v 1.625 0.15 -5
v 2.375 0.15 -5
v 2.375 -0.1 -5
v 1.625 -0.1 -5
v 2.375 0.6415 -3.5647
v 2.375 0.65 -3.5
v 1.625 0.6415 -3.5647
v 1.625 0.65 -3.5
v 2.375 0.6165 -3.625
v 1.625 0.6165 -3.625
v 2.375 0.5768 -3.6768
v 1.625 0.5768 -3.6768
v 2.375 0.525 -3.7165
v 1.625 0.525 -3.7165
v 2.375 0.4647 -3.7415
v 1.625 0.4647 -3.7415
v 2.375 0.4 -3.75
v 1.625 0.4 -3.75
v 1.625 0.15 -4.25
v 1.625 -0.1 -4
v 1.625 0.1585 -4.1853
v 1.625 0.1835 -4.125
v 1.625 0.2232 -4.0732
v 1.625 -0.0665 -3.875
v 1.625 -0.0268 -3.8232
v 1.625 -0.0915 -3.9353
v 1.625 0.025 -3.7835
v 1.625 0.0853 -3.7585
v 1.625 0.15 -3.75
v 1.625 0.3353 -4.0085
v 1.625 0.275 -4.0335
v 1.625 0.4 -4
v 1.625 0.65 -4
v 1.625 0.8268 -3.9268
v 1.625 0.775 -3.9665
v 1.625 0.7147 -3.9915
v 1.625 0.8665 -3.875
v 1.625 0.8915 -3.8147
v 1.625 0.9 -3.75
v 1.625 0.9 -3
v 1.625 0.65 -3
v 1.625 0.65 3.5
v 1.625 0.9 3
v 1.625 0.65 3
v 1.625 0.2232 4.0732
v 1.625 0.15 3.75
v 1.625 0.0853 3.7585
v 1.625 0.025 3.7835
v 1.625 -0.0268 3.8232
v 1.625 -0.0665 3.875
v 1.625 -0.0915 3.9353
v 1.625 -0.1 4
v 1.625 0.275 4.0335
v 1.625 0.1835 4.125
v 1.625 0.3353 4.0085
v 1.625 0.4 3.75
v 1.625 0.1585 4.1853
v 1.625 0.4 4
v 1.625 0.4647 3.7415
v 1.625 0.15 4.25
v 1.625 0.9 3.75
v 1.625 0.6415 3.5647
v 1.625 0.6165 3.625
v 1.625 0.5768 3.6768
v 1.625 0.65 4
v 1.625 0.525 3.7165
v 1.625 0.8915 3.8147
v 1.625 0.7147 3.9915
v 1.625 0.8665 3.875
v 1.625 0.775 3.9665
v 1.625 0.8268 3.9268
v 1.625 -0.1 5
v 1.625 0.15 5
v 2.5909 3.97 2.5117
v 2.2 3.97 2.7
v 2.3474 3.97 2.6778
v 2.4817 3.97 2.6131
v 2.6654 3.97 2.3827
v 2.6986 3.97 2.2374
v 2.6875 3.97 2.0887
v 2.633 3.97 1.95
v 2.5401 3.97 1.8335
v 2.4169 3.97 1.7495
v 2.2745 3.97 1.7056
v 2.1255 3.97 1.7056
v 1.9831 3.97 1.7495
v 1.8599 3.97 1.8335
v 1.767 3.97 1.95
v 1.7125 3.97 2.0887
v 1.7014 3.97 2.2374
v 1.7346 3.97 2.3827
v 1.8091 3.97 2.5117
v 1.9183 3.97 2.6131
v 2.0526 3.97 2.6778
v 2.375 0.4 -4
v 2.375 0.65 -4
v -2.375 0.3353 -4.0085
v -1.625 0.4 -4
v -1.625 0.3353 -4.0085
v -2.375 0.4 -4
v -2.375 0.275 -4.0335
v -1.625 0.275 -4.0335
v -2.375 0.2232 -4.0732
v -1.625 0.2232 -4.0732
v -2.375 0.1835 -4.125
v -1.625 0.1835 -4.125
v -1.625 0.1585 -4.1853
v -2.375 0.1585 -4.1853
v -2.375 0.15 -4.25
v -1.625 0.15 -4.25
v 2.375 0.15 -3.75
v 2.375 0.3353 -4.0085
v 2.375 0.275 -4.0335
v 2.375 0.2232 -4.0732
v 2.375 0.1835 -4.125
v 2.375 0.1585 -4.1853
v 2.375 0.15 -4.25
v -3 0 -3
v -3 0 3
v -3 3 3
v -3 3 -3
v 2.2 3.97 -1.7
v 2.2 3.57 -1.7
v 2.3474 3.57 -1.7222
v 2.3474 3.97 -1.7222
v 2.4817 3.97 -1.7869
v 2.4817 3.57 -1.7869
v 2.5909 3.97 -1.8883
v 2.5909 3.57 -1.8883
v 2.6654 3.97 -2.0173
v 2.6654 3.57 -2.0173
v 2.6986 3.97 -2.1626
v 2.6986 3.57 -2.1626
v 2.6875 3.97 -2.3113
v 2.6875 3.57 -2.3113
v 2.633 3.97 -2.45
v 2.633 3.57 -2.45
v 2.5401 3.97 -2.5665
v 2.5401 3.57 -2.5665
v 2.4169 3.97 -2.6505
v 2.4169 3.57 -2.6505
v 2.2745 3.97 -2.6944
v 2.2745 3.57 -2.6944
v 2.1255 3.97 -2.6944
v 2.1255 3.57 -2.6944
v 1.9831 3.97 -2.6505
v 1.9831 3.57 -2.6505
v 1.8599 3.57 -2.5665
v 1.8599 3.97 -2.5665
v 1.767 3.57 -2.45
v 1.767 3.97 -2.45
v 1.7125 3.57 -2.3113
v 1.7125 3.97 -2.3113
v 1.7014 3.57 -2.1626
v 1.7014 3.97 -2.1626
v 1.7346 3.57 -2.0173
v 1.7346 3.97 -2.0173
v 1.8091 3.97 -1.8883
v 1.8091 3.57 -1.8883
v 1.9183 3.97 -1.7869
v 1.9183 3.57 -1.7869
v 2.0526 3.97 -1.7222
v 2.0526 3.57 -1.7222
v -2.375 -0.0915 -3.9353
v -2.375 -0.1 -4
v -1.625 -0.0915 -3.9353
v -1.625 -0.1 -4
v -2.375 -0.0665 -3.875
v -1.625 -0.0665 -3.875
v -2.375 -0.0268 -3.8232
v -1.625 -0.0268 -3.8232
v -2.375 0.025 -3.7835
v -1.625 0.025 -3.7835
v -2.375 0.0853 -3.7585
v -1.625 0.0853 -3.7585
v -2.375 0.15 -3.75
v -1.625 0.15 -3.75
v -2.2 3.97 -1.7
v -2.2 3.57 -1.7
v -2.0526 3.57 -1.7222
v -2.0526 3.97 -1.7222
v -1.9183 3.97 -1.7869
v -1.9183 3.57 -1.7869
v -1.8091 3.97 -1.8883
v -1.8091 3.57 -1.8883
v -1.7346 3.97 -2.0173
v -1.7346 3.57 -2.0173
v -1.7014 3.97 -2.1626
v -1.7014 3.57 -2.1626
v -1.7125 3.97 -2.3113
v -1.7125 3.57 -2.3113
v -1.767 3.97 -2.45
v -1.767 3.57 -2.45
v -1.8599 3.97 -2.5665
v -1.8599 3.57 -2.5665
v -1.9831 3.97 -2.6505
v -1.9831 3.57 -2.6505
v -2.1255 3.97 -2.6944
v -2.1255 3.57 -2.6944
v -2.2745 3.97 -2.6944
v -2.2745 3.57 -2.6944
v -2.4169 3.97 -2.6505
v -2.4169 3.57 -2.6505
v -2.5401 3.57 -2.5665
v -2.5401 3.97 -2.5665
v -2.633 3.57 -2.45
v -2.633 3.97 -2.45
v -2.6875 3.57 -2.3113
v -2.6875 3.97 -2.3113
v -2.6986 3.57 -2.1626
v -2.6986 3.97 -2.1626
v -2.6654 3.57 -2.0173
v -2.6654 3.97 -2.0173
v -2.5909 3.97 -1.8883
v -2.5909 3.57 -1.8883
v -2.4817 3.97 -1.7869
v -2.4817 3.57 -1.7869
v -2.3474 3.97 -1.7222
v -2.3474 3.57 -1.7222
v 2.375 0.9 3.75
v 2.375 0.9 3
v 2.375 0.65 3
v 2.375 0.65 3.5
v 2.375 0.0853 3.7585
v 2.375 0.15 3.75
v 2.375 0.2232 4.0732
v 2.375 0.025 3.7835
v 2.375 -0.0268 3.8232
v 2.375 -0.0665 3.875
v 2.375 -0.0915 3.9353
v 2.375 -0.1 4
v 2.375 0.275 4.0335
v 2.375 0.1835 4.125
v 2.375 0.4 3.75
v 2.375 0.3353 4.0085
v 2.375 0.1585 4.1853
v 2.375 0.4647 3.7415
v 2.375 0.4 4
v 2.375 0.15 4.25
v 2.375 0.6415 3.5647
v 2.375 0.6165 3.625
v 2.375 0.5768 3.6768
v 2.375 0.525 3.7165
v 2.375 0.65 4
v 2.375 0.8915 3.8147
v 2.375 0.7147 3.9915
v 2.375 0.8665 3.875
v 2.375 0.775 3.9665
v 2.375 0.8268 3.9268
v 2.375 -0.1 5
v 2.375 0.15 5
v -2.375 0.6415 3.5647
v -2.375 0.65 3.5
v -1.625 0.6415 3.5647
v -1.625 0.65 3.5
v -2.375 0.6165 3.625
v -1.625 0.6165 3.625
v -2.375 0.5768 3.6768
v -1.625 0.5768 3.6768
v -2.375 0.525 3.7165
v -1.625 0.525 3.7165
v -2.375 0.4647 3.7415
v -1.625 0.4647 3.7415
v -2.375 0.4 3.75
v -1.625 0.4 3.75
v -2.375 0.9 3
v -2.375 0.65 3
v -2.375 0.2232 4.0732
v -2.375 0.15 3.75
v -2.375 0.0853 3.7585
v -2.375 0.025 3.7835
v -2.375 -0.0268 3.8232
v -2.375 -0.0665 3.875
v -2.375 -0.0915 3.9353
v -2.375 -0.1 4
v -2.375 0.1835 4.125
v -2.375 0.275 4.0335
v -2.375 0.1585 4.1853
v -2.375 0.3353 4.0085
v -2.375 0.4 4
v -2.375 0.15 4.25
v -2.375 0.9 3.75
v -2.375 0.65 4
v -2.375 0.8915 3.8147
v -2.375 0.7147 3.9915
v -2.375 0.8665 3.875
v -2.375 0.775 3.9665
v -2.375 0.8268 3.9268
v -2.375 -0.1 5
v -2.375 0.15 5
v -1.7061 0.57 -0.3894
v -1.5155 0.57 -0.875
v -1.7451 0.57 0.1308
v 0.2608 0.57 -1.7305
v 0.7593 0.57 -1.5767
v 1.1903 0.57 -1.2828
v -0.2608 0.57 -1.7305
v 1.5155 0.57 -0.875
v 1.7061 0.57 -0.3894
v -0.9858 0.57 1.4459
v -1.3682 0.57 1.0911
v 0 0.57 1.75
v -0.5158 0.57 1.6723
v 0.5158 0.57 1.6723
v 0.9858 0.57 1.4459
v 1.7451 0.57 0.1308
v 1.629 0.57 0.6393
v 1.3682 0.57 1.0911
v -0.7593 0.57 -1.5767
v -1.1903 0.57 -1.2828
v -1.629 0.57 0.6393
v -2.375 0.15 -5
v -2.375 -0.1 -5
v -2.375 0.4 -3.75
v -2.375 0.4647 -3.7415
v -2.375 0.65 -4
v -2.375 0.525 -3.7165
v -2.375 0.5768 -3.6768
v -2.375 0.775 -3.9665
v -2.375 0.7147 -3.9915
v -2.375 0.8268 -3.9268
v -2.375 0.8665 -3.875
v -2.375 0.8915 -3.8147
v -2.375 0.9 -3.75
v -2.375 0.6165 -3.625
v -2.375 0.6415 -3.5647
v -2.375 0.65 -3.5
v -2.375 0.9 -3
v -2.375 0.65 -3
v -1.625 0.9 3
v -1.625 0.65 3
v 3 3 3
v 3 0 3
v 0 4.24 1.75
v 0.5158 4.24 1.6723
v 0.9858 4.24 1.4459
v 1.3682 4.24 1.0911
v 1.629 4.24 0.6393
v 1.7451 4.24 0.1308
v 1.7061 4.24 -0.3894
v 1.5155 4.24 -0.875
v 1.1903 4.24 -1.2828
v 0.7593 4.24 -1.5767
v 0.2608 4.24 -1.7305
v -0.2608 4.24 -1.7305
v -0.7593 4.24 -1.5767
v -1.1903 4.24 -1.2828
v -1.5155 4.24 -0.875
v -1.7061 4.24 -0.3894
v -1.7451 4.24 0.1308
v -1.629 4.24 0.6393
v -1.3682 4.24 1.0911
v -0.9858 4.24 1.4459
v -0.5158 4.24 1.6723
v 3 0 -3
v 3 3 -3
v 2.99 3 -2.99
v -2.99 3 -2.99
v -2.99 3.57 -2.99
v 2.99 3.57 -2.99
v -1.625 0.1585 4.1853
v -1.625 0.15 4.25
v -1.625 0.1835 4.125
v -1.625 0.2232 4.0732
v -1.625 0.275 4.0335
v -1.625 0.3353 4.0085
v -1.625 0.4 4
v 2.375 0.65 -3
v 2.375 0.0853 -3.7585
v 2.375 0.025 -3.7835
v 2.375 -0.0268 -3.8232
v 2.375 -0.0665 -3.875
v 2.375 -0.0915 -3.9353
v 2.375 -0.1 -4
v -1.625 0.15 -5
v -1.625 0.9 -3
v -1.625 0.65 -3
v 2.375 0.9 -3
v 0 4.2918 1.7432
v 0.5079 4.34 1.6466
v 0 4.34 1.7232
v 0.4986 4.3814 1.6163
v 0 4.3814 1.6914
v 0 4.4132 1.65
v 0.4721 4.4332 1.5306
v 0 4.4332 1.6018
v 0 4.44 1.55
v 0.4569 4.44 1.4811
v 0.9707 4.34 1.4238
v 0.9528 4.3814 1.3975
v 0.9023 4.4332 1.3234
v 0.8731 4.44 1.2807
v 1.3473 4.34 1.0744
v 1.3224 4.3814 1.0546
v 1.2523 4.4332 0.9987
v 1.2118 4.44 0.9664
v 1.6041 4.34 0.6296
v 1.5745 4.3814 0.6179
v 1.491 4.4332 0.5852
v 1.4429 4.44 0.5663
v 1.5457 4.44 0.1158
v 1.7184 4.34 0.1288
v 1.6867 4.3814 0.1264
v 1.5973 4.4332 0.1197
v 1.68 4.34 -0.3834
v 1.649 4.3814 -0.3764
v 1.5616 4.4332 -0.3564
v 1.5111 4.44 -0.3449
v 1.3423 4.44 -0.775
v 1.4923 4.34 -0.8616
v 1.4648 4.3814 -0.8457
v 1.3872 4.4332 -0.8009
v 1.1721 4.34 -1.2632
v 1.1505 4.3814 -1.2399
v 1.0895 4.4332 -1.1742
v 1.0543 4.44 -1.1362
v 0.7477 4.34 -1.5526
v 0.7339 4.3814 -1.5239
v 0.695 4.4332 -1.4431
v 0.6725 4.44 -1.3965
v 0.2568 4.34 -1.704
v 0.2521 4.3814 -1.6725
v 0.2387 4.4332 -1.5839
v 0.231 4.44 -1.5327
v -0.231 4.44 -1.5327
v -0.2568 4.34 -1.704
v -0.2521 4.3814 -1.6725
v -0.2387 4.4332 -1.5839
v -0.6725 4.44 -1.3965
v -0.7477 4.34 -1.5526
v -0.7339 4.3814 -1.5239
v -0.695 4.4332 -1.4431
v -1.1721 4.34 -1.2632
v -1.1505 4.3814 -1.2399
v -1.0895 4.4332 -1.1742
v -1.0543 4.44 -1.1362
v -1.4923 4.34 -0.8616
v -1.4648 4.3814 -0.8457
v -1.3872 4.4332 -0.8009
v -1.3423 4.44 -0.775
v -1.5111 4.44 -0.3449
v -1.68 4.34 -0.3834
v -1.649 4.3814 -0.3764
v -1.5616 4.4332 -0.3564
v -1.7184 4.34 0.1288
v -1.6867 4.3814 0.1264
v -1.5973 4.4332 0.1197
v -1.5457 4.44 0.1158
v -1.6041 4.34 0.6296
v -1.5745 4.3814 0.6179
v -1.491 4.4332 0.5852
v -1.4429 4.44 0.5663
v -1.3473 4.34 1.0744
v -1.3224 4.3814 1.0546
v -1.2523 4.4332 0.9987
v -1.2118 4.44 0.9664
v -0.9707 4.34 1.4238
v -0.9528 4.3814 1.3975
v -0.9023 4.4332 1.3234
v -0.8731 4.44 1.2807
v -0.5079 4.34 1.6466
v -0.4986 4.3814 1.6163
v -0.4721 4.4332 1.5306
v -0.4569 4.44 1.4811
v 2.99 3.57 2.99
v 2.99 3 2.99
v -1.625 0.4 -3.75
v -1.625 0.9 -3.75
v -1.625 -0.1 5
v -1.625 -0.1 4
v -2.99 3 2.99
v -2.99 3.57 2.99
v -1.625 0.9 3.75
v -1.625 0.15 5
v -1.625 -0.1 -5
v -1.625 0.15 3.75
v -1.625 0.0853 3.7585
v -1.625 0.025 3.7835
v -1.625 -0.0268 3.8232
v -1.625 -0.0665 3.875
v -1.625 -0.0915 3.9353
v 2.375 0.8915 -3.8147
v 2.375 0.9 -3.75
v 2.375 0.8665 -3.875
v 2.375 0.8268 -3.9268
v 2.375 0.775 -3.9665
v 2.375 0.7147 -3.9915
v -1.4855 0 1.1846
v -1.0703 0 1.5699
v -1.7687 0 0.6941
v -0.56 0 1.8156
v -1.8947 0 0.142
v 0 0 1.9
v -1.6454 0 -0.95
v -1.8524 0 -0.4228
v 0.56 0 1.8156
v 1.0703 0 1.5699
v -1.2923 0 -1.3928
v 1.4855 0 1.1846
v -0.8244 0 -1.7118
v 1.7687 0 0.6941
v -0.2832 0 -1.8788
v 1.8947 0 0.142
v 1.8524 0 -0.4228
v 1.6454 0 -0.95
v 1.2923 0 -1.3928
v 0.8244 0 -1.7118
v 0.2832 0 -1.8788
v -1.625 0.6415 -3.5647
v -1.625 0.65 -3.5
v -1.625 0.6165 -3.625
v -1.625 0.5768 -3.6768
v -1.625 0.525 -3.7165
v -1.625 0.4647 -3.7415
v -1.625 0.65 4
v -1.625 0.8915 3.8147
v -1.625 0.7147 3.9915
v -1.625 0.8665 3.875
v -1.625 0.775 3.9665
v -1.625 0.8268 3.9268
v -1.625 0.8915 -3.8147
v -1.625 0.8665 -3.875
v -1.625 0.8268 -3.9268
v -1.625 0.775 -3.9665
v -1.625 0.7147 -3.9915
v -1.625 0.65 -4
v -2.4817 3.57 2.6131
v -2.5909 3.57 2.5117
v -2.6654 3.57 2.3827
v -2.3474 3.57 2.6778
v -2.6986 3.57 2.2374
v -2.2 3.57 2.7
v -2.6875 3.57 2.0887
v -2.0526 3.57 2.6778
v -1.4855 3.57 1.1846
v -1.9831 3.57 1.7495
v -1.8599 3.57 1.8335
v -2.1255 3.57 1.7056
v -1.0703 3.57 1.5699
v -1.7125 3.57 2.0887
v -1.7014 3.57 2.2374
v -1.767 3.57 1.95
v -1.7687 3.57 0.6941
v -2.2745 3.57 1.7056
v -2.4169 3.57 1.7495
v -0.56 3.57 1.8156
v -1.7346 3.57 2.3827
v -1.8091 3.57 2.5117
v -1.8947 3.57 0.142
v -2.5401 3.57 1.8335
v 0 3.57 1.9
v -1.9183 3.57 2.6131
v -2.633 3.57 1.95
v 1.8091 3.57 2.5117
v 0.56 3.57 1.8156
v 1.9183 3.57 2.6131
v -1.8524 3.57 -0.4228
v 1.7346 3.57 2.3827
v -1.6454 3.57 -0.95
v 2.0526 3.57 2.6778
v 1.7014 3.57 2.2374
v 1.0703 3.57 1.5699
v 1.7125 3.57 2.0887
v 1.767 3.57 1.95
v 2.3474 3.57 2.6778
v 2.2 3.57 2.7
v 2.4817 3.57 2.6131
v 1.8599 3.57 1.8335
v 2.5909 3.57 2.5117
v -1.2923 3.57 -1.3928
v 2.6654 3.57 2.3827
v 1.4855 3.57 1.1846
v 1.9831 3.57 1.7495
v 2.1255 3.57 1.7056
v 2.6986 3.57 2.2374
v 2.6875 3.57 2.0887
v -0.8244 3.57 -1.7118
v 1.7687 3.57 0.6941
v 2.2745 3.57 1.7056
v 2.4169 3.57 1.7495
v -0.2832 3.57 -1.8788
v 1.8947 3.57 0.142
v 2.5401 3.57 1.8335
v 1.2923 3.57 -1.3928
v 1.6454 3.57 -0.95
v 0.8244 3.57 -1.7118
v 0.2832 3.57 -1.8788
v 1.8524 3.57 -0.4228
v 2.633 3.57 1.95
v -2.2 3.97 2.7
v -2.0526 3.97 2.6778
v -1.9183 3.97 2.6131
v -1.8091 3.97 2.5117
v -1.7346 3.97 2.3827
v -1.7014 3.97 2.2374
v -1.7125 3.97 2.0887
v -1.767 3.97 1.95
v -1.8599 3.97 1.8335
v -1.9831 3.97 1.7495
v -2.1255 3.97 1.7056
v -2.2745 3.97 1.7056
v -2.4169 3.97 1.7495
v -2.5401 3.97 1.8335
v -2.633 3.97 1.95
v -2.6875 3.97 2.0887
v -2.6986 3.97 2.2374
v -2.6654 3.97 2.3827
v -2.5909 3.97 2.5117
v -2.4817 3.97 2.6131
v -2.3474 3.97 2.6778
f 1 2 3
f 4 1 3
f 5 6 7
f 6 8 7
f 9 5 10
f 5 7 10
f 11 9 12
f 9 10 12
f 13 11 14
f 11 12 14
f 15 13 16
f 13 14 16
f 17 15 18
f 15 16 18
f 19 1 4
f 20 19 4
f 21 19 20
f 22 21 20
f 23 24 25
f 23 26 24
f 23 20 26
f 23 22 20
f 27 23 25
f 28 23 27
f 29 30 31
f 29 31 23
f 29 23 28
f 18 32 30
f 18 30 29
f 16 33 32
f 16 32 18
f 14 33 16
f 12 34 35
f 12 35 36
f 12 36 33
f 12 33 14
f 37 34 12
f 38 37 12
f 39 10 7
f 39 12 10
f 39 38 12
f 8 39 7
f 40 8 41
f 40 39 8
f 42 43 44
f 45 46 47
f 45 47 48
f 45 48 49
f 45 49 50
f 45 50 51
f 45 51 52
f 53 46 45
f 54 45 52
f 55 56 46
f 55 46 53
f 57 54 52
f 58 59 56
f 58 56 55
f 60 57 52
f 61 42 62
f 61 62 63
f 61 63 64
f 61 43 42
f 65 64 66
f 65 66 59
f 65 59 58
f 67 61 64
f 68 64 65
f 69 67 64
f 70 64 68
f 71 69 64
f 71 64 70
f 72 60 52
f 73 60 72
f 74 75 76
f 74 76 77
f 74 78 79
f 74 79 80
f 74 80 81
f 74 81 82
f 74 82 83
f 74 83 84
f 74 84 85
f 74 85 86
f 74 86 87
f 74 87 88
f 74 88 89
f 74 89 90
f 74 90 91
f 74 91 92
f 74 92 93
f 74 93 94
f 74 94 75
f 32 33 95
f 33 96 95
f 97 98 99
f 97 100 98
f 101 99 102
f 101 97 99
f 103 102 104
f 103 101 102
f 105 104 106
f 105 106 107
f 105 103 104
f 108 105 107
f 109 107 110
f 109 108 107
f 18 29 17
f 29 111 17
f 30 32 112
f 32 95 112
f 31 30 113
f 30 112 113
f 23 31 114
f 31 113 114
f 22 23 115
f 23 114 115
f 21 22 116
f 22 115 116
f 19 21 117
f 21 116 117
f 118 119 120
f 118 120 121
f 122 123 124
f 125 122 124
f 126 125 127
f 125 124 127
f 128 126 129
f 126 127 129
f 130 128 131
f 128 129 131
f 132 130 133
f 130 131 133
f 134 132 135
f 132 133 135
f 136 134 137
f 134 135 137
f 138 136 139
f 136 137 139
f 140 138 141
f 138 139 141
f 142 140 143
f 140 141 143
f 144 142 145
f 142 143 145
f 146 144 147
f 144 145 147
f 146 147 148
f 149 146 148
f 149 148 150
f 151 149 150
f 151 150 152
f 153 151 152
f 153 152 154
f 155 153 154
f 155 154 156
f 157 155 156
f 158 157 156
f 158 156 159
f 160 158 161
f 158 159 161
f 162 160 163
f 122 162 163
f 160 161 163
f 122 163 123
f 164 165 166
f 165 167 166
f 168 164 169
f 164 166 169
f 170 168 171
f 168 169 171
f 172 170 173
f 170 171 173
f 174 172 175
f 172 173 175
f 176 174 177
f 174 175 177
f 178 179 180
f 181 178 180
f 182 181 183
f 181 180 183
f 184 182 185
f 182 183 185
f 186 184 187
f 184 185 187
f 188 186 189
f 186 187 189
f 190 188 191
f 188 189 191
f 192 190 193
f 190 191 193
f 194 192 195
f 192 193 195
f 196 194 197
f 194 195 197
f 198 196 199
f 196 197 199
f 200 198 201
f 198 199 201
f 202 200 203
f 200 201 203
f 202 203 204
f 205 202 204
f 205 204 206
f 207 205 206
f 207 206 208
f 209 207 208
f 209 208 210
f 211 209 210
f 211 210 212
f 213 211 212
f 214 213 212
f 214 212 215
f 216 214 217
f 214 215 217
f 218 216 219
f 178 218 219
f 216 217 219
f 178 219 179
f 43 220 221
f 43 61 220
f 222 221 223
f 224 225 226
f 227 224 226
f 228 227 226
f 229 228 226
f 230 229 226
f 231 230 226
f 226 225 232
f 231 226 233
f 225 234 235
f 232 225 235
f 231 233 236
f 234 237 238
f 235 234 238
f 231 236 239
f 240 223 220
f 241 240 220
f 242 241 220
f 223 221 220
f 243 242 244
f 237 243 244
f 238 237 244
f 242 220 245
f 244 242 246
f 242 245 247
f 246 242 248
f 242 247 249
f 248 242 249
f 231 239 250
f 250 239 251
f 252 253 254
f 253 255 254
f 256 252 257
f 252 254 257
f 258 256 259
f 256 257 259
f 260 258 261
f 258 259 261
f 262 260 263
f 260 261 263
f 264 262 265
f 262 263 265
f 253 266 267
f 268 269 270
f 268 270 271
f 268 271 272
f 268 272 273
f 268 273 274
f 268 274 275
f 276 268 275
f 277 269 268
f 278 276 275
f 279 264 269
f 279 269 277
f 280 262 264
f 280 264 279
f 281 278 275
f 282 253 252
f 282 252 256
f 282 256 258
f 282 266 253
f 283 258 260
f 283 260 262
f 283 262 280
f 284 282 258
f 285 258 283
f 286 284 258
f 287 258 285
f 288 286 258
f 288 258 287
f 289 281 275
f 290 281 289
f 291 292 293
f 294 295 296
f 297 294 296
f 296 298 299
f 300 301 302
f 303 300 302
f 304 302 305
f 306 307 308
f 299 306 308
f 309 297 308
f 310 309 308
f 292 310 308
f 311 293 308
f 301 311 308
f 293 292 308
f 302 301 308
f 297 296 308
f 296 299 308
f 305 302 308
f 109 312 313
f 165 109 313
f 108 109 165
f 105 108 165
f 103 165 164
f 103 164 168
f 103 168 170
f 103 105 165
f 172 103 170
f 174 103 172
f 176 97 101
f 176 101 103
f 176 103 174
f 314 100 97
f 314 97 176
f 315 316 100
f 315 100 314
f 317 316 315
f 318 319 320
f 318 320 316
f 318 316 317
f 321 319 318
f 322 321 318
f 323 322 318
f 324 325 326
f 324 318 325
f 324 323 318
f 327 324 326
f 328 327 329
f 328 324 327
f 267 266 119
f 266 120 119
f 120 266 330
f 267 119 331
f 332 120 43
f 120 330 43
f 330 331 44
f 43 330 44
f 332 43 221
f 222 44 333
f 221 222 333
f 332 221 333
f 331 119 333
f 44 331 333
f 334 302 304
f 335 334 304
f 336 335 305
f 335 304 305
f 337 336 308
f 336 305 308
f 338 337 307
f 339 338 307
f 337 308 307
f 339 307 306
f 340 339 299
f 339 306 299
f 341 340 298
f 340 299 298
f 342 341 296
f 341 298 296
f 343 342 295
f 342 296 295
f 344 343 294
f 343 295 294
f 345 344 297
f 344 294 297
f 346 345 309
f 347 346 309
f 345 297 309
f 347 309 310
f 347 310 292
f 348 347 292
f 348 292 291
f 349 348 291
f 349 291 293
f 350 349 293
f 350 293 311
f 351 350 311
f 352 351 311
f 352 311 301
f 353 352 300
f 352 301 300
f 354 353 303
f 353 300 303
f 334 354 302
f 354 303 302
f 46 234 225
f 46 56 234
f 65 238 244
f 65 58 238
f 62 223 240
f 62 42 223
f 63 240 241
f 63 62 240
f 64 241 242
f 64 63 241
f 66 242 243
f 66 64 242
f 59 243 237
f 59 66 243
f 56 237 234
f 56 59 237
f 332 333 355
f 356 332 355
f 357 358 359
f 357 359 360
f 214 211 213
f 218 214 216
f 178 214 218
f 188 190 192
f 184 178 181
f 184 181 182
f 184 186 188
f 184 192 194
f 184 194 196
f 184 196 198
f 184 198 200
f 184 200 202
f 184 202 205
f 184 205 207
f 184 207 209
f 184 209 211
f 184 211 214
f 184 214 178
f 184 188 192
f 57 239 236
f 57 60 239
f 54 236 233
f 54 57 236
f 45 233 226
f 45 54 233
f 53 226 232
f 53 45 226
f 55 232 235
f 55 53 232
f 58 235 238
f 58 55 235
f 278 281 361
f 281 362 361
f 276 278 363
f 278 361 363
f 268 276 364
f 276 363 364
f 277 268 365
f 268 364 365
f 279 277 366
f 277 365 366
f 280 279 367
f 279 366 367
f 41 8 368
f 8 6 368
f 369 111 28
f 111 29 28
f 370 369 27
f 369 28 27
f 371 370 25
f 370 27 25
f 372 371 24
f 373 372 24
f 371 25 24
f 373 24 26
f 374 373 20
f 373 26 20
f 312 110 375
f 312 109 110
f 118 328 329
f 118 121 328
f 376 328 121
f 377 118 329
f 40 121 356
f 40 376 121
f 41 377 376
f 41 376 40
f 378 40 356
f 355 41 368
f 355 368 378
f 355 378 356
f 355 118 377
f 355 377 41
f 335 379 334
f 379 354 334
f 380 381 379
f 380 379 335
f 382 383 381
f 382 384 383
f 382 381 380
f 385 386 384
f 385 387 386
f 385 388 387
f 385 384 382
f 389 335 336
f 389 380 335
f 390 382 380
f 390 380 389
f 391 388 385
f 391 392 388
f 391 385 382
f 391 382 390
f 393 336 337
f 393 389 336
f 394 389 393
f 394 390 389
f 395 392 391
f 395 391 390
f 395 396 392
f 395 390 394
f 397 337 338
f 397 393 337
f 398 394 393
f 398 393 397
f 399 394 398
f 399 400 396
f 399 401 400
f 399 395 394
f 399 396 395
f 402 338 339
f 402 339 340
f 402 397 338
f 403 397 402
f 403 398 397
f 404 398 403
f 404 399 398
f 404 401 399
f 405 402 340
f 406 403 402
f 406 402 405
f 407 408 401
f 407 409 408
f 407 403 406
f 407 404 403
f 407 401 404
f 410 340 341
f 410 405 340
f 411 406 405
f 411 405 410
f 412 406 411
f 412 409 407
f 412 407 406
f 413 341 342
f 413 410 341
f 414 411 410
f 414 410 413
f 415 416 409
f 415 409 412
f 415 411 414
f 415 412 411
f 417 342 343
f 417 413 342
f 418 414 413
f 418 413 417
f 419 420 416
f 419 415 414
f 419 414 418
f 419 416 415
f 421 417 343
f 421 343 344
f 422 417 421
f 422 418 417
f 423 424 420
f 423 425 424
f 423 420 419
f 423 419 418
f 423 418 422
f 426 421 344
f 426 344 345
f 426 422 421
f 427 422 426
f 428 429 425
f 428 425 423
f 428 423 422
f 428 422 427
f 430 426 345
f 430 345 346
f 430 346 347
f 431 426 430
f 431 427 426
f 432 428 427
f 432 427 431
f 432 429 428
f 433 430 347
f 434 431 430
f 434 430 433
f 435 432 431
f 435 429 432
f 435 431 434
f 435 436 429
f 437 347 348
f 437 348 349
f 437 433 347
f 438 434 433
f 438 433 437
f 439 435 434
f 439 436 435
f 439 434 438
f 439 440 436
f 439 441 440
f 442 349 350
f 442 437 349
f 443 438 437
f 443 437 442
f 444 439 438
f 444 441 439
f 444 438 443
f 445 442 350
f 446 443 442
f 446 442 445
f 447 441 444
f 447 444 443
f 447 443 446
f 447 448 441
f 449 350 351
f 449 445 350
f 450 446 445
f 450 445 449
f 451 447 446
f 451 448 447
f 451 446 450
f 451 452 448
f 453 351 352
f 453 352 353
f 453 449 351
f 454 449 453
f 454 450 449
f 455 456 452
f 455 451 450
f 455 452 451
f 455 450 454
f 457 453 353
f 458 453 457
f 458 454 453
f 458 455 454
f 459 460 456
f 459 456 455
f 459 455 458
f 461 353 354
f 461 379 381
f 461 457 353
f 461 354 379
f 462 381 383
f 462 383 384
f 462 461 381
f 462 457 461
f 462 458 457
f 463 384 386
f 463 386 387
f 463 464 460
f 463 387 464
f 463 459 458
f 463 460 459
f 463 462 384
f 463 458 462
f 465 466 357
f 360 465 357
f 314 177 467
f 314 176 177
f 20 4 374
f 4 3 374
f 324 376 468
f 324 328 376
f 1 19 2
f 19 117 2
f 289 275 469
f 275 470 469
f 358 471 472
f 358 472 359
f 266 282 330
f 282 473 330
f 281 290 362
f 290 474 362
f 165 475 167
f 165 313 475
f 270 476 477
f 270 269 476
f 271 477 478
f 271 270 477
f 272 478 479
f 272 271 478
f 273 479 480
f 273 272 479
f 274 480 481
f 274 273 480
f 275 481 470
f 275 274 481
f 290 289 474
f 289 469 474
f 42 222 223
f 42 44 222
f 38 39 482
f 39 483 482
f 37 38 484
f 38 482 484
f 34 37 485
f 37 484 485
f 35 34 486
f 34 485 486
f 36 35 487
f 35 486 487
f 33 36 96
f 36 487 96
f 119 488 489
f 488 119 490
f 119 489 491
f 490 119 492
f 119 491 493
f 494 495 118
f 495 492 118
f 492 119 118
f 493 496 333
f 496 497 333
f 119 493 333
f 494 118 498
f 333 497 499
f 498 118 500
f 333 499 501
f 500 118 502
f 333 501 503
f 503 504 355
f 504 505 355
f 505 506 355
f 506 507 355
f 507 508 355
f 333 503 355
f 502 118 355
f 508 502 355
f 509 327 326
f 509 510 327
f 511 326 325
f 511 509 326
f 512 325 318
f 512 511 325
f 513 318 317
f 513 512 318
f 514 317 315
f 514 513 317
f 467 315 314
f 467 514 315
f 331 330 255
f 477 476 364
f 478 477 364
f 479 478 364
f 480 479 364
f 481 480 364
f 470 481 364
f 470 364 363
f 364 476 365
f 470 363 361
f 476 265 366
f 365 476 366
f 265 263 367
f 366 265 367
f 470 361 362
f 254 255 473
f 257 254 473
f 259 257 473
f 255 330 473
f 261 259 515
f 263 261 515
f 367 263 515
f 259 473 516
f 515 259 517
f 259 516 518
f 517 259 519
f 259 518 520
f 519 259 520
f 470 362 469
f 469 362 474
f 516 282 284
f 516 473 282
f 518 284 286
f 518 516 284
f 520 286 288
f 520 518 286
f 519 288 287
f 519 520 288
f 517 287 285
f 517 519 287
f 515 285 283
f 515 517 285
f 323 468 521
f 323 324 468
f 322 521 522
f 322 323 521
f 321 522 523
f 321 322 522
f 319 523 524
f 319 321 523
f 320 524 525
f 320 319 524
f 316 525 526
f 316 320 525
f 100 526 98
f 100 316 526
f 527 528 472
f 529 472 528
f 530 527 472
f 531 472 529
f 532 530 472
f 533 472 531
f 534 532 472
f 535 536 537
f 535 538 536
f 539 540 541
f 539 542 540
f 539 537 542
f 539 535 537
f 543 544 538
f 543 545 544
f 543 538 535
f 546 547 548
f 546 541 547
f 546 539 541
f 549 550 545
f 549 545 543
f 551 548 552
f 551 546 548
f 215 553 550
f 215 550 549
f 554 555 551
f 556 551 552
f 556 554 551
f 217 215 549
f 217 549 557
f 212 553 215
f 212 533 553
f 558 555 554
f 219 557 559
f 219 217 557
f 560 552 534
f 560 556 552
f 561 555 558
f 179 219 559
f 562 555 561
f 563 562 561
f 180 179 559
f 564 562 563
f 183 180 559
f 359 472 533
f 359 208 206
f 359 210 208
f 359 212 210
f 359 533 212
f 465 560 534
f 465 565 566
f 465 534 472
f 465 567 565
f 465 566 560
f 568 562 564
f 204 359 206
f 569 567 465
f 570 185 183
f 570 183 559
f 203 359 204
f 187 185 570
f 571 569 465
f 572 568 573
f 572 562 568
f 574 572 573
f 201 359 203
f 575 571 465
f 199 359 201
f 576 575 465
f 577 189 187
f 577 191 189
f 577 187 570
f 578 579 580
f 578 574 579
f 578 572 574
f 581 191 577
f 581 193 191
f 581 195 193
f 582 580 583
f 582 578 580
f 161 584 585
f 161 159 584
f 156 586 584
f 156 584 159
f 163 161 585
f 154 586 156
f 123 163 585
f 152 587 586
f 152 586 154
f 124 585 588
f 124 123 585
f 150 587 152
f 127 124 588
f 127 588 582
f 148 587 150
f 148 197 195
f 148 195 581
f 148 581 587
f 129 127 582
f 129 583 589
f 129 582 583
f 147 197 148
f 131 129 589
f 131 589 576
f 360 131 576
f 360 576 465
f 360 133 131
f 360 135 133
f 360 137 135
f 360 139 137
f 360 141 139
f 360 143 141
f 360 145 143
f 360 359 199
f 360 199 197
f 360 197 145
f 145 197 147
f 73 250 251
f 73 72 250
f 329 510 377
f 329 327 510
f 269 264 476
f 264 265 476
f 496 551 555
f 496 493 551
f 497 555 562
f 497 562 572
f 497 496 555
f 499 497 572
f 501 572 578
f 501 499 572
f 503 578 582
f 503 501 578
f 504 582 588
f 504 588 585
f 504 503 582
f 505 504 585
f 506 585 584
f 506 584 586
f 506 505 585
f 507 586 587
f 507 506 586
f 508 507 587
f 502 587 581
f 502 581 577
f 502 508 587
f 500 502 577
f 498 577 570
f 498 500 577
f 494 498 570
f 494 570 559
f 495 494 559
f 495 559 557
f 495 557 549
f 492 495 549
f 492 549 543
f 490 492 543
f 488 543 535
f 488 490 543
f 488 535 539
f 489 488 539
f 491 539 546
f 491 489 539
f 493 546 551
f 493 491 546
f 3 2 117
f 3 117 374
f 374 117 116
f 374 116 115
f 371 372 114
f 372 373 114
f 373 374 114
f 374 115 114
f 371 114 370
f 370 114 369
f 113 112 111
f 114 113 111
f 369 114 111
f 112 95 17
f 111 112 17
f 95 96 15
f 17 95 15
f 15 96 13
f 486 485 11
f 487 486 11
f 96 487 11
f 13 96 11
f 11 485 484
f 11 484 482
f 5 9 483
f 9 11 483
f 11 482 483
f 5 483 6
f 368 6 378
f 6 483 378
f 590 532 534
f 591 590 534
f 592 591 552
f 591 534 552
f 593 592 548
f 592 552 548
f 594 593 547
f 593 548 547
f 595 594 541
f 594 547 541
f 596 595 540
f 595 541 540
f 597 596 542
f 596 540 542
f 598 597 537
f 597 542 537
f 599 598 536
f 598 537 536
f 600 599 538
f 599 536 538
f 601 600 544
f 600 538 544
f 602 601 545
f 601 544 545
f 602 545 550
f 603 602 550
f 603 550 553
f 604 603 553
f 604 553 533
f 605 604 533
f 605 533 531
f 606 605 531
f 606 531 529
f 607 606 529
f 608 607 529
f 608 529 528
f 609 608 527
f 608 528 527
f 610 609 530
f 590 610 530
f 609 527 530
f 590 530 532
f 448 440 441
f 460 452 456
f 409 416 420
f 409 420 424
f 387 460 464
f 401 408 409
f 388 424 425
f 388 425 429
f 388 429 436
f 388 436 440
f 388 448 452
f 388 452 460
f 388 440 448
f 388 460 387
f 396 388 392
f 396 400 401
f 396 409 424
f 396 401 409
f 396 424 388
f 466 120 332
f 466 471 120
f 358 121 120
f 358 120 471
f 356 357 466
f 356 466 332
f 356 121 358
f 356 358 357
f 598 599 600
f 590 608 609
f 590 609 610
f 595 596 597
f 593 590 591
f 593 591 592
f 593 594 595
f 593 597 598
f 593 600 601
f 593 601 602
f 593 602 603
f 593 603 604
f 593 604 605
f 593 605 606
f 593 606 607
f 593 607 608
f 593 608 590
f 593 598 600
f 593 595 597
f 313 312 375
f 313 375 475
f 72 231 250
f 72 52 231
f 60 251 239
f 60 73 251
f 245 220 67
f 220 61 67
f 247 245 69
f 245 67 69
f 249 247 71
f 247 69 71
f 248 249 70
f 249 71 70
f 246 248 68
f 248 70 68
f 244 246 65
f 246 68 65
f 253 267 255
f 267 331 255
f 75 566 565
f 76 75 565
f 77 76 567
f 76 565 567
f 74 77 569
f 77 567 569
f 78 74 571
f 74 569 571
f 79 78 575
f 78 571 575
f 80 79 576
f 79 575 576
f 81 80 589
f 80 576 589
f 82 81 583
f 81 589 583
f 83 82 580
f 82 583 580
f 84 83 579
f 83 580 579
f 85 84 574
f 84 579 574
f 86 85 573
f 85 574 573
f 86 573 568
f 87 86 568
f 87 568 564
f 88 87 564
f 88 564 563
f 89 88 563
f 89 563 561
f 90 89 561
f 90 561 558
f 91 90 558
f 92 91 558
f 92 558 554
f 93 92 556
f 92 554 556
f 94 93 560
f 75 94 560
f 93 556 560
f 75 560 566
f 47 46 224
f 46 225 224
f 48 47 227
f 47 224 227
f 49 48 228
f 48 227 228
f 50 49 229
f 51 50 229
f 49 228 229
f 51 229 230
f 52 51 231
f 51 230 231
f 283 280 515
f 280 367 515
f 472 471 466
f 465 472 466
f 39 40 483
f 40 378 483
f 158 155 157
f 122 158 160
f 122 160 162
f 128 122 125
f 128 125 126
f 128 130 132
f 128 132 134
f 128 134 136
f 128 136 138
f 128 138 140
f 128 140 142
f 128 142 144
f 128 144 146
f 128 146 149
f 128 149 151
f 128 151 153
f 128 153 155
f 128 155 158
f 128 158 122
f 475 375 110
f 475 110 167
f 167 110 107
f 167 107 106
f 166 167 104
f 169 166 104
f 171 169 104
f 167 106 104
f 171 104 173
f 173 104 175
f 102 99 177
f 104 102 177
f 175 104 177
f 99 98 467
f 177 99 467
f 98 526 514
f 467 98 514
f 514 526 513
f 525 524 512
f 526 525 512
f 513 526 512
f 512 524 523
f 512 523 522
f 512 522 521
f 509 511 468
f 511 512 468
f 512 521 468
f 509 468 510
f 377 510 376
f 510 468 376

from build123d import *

# Parameters (mm, degrees)
SKETCH1_W            = 6
SKETCH1_H            = 6
SKETCH1_R            = 1.9
EXTRUDE1_DEPTH       = 3
SKETCH2_W            = 5.98
SKETCH2_H            = 5.98
SKETCH2_R            = 1.9
EXTRUDE2_DEPTH       = 0.57
SKETCH3_R            = 0.5
EXTRUDE3_DEPTH       = 0.4
EXTRUDE4_DEPTH       = 0.87
EXTRUDE4_DEPTH_BACK  = 3
SKETCH4_R            = 1.75
FILLET1_R            = 0.2
EXTRUDE5_DEPTH       = 0.375
FILLET2_R            = 0.25
FILLET2_OF_MIRROR1_R = 0.25


with BuildPart() as part:
    # Sketch1 → Extrude1 (new body)
    with BuildSketch(Plane(origin=(0, 0, 0), x_dir=(1, 0, 0), z_dir=(0, 1, 0))):
        Rectangle(SKETCH1_W, SKETCH1_H)
        with Locations(Location((0, 0, 0), (0, 0, 270))):
            Circle(SKETCH1_R, mode=Mode.SUBTRACT)
    extrude(amount=EXTRUDE1_DEPTH)

    # Sketch2 → Extrude2 (add)
    with BuildSketch(Plane(origin=(0, 3, 0), x_dir=(1, 0, 0), z_dir=(0, 1, 0))):
        Rectangle(SKETCH2_W, SKETCH2_H)
        with Locations(Location((0, 0, 0), (0, 0, 270))):
            Circle(SKETCH2_R, mode=Mode.SUBTRACT)
    extrude(amount=EXTRUDE2_DEPTH)

    # Sketch3 → Extrude3 (add)
    with BuildSketch(Plane(origin=(0, 3.57, 0), x_dir=(1, 0, 0), z_dir=(0, 1, 0))):
        with Locations(Location((-2.2, 2.2, 0), (0, 0, 270))):
            Circle(SKETCH3_R)
        with Locations(Location((2.2, 2.2, 0), (0, 0, 270))):
            Circle(SKETCH3_R)
        with Locations(Location((2.2, -2.2, 0), (0, 0, 270))):
            Circle(SKETCH3_R)
        with Locations(Location((-2.2, -2.2, 0), (0, 0, 270))):
            Circle(SKETCH3_R)
    extrude(amount=EXTRUDE3_DEPTH)

    # Sketch5 → Extrude5 (add, symmetric)
    with BuildSketch(Plane(origin=(2, 0, 0), x_dir=(0, 0, -1), z_dir=(1, 0, 0))):
        Polygon((-5, 0.15), (-4, 0.15), (-4, 0.9), (-3, 0.9), (-3, 0.65), (-3.75, 0.65), (-3.75, -0.1), (-5, -0.1), align=None)
        Polygon((5, 0.15), (5, -0.1), (3.75, -0.1), (3.75, 0.65), (3, 0.65), (3, 0.9), (4, 0.9), (4, 0.15), align=None)
    extrude5 = extrude(amount=EXTRUDE5_DEPTH, both=True)

    # Fillet2
    fillet2_edges = [part.edges().sort_by_distance(p)[0] for p in [
        (2, -0.1, 3.75),
        (2, 0.65, 3.75),
        (2, 0.9, 4),
        (2, 0.15, 4),
        (2, 0.15, -4),
        (2, 0.9, -4),
        (2, 0.65, -3.75),
        (2, -0.1, -3.75),
    ]]
    fillet(fillet2_edges, radius=FILLET2_R)

    # Mirror1: Extrude5 across plane
    add(extrude5.mirror(Plane(origin=(0, 0, 0), x_dir=(0, 0, 1), z_dir=(1, 0, 0))))

    # Fillet2 of Mirror1
    fillet2_of_mirror1_edges = [part.edges().sort_by_distance(p)[0] for p in [
        (-2, -0.1, 3.75),
        (-2, 0.65, 3.75),
        (-2, 0.9, 4),
        (-2, 0.15, 4),
        (-2, 0.15, -4),
        (-2, 0.9, -4),
        (-2, 0.65, -3.75),
        (-2, -0.1, -3.75),
    ]]
    fillet(fillet2_of_mirror1_edges, radius=FILLET2_OF_MIRROR1_R)


with BuildPart() as body_2:
    # Sketch4 → Extrude4 (new, two sides: drawn at the far end of the back side and taken through both)
    with BuildSketch(Plane(origin=(0, 3.57, 0), x_dir=(1, 0, 0), z_dir=(0, 1, 0)).offset(-EXTRUDE4_DEPTH_BACK)):
        with Locations(Location((0, 0, 0), (0, 0, 270))):
            Circle(SKETCH4_R)
    extrude(amount=EXTRUDE4_DEPTH + EXTRUDE4_DEPTH_BACK)

    # Fillet1
    fillet1_edges = [body_2.edges().sort_by_distance(p)[0] for p in [
        (0, 4.44, -1.75),
    ]]
    fillet(fillet1_edges, radius=FILLET1_R)


solid = Compound([part.part, body_2.part])
